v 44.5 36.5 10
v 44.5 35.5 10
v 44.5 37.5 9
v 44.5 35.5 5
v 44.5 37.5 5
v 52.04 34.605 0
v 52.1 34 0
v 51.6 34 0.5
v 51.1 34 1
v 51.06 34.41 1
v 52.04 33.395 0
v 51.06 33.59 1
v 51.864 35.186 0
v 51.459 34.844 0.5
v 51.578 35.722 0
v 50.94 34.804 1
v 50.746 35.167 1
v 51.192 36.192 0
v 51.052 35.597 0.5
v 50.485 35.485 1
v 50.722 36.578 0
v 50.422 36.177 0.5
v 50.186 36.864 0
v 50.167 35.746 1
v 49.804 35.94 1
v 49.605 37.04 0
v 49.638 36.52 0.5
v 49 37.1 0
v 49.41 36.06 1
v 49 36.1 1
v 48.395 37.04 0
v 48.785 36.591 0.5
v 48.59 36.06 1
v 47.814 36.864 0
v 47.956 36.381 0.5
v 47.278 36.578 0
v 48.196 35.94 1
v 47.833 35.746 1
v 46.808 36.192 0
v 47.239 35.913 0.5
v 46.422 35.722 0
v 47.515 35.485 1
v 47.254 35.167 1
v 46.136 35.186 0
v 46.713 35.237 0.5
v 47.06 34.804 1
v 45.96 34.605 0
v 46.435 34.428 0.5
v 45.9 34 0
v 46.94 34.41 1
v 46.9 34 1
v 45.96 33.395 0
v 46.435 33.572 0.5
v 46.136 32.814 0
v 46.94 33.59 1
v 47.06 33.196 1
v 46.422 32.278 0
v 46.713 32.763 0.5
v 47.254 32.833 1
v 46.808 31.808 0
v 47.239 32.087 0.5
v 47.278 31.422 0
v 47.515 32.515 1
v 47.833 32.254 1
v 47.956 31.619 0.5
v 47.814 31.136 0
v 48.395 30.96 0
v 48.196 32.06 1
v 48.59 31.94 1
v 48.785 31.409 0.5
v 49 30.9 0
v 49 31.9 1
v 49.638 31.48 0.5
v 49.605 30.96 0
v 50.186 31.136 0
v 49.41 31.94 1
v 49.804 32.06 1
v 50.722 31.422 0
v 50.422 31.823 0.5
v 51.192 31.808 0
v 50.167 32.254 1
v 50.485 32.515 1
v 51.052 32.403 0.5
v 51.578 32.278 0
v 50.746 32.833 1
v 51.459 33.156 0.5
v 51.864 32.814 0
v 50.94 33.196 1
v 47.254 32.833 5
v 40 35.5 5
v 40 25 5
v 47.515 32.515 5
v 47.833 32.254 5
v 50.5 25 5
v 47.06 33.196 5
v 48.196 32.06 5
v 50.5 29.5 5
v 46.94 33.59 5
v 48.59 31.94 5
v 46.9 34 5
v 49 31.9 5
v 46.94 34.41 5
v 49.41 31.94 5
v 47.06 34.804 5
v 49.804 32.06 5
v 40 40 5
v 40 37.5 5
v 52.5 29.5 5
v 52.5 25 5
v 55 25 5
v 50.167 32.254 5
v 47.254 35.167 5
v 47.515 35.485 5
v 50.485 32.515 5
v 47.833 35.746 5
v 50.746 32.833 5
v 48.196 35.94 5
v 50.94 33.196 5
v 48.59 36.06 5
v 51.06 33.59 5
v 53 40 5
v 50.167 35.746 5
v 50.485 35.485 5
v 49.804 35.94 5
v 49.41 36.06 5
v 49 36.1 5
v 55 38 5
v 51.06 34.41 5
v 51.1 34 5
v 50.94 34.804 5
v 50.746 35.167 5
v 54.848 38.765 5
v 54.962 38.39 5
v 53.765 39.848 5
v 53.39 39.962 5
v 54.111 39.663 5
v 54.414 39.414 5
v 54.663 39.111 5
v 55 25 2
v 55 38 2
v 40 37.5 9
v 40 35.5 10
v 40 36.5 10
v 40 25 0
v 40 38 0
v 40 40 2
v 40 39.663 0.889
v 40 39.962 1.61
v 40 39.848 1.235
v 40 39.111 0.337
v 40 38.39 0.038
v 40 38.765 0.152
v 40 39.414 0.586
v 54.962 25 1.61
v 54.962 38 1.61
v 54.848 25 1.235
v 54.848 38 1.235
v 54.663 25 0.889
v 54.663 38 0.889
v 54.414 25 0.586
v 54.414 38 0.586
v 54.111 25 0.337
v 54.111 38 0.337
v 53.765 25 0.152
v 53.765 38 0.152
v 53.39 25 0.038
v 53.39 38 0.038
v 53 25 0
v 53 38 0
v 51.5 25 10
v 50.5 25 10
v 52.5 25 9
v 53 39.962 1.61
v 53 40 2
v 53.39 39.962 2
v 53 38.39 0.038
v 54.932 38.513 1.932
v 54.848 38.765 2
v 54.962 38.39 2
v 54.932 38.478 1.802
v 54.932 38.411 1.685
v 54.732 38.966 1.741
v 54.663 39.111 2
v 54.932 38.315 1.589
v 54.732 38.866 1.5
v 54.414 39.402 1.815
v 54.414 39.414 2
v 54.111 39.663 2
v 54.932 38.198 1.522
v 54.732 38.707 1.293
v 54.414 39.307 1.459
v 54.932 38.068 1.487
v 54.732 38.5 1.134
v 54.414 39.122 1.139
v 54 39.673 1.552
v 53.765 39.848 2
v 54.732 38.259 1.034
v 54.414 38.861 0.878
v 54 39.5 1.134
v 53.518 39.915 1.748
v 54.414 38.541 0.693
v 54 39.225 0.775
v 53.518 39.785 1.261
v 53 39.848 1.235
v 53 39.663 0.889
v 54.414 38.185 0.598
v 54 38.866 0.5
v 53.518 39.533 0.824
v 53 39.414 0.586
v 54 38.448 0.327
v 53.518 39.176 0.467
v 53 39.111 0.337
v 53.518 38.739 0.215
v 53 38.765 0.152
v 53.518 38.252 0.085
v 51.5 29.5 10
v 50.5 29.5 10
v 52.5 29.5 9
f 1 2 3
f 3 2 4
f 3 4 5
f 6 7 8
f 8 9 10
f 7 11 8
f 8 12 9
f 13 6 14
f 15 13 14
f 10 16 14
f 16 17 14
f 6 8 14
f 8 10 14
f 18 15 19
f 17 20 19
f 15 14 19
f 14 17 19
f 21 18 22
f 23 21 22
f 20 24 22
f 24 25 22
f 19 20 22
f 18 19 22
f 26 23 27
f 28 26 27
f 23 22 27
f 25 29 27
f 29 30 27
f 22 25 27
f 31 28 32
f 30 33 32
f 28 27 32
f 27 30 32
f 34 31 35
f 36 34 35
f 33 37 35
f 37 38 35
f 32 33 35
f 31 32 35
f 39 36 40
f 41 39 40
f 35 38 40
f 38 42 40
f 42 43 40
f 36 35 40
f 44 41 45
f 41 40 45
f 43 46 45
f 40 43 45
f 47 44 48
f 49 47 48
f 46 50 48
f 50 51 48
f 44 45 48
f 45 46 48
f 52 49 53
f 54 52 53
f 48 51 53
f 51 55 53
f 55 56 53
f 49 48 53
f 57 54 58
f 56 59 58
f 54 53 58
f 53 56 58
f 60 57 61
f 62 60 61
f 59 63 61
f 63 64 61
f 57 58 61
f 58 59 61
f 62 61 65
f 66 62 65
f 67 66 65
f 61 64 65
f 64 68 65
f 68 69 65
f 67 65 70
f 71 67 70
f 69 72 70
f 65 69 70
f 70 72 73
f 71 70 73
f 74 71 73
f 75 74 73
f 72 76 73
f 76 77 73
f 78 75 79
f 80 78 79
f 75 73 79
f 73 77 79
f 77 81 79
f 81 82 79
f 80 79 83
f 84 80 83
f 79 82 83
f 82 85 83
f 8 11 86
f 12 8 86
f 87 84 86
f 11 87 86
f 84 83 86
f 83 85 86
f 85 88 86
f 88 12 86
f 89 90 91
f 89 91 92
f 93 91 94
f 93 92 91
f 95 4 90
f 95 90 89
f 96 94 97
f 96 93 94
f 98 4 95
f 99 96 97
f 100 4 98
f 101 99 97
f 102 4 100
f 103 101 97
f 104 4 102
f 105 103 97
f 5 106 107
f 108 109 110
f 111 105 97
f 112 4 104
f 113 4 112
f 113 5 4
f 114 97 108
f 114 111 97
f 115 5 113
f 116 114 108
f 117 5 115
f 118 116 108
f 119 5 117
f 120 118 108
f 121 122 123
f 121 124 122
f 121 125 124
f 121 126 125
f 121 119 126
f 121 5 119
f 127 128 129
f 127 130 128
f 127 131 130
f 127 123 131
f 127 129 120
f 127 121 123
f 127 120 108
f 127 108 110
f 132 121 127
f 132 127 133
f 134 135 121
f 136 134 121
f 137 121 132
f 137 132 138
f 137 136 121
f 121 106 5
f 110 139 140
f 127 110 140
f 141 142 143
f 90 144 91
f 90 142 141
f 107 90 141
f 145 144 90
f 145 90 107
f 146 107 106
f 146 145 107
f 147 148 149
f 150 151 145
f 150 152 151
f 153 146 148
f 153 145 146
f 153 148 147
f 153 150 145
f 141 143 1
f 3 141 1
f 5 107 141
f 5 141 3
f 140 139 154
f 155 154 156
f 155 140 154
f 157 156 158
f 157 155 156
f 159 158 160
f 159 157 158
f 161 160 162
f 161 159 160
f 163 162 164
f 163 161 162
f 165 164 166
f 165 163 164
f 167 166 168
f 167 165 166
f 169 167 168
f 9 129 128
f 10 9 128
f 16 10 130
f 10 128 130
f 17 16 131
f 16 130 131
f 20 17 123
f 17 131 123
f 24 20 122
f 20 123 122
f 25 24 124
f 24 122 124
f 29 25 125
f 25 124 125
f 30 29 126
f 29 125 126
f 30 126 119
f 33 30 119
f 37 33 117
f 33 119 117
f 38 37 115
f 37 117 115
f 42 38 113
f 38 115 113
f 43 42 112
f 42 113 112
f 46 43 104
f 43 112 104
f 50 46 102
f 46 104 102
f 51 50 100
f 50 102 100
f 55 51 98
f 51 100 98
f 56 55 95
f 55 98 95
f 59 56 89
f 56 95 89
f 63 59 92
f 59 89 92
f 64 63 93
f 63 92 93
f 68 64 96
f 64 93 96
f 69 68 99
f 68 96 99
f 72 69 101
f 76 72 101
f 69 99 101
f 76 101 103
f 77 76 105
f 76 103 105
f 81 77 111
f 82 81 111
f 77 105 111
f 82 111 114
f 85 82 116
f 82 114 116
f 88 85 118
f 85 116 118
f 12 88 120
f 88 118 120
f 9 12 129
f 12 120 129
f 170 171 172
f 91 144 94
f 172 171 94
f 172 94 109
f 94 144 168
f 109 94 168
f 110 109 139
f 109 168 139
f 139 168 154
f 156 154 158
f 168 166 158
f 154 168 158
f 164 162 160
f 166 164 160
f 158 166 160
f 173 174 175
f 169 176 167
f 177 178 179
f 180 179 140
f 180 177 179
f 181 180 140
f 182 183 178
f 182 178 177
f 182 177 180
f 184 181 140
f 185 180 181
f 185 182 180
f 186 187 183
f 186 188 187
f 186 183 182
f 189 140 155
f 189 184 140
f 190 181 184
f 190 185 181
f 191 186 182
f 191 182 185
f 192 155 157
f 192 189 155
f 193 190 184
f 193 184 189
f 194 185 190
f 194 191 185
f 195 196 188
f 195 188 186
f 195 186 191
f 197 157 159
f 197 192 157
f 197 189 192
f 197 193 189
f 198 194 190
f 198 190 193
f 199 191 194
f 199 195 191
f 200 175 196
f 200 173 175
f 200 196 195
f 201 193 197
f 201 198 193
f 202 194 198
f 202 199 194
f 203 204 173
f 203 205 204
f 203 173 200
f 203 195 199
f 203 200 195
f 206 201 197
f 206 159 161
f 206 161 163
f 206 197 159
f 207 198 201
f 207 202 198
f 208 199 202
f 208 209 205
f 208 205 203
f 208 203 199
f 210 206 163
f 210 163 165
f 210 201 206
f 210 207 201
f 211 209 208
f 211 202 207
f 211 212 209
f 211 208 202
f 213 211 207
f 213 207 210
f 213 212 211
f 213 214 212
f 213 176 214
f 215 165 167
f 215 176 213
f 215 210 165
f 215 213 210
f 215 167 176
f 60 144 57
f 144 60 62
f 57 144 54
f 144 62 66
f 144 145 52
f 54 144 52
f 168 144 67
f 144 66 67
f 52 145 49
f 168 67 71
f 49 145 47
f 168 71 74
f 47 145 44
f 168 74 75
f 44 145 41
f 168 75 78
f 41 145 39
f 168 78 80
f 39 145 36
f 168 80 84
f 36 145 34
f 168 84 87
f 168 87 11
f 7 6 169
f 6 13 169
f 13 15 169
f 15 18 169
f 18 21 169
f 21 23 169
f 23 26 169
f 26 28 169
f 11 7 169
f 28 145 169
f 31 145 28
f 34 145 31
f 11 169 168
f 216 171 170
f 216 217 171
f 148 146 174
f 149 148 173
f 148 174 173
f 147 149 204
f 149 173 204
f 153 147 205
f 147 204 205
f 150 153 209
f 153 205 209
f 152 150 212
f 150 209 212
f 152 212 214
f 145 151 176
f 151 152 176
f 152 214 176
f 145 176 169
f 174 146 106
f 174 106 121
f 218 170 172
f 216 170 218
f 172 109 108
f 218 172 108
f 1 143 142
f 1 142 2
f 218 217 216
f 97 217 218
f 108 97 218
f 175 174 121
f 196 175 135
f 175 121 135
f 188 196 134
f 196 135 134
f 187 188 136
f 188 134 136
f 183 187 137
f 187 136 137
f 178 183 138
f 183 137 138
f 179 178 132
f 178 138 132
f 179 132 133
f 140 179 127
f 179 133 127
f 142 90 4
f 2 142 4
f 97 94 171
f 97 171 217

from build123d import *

# Parameters (mm, degrees)
BOX_W           = 15
BOX_H           = 15
BOX_DEPTH       = 15
SKETCH_W        = 110
SKETCH_H        = 80
PAD_DEPTH       = 5
SKETCH001_R     = 2.1
POCKET_DEPTH    = 5
CHAMFER_SIZE    = 1
SKETCH002_W     = 89
SKETCH002_H     = 2
SKETCH002_W_2   = 2
SKETCH002_H_2   = 59
PAD001_DEPTH    = 5
CHAMFER001_SIZE = 1
FILLET_R        = 2


with BuildPart() as cube:
    # Box → Box (new body)
    with BuildSketch(Plane(origin=(40, 25, 0), x_dir=(1, 0, 0), z_dir=(0, 0, 1))):
        with Locations((7.5, 7.5)):
            Rectangle(BOX_W, BOX_H)
    extrude(amount=BOX_DEPTH)


with BuildPart() as common:
    # Sketch → Pad (new body)
    with BuildSketch(Plane.XY):
        Rectangle(SKETCH_W, SKETCH_H)
    extrude(amount=PAD_DEPTH)

    # Sketch001 (on Face6 of Pad) → Pocket (cut)
    with BuildSketch(Plane.XY.offset(5)):
        with Locations((49, 34)):
            Circle(SKETCH001_R)
        with Locations((-49, 34)):
            Circle(SKETCH001_R)
        with Locations((-49, -34)):
            Circle(SKETCH001_R)
        with Locations((49, -34)):
            Circle(SKETCH001_R)
    extrude(amount=-POCKET_DEPTH, mode=Mode.SUBTRACT)

    # Chamfer
    chamfer_edges = [common.edges().sort_by_distance(p)[0] for p in [
        (-51.1, -34, 0),
        (-51.1, 34, 0),
        (46.9, 34, 0),
        (46.9, -34, 0),
    ]]
    chamfer(chamfer_edges, length=CHAMFER_SIZE)

    # Sketch002 (on Face11 of Chamfer) → Pad001 (join)
    with BuildSketch(Plane.XY.offset(5)):
        with Locations((0, 36.5)):
            Rectangle(SKETCH002_W, SKETCH002_H)
        with Locations((0, -36.5)):
            Rectangle(SKETCH002_W, SKETCH002_H)
        with Locations((51.5, 0)):
            Rectangle(SKETCH002_W_2, SKETCH002_H_2)
        with Locations((-51.5, 0)):
            Rectangle(SKETCH002_W_2, SKETCH002_H_2)
    extrude(amount=PAD001_DEPTH)

    # Chamfer001
    chamfer001_edges = [common.edges().sort_by_distance(p)[0] for p in [
        (-52.5, 0, 10),
        (0, 37.5, 10),
        (52.5, 0, 10),
        (0, -37.5, 10),
    ]]
    chamfer(chamfer001_edges, length=CHAMFER001_SIZE)

    # Fillet
    fillet_edges = [common.edges().sort_by_distance(p)[0] for p in [
        (-55, -40, 2.5),
        (-55, 0, 0),
        (-55, 40, 2.5),
        (0, 40, 0),
        (55, 40, 2.5),
        (55, 0, 0),
        (55, -40, 2.5),
        (0, -40, 0),
    ]]
    fillet(fillet_edges, radius=FILLET_R)

    # Common: intersect Cube
    add(cube.part, mode=Mode.INTERSECT)


solid = common.part
